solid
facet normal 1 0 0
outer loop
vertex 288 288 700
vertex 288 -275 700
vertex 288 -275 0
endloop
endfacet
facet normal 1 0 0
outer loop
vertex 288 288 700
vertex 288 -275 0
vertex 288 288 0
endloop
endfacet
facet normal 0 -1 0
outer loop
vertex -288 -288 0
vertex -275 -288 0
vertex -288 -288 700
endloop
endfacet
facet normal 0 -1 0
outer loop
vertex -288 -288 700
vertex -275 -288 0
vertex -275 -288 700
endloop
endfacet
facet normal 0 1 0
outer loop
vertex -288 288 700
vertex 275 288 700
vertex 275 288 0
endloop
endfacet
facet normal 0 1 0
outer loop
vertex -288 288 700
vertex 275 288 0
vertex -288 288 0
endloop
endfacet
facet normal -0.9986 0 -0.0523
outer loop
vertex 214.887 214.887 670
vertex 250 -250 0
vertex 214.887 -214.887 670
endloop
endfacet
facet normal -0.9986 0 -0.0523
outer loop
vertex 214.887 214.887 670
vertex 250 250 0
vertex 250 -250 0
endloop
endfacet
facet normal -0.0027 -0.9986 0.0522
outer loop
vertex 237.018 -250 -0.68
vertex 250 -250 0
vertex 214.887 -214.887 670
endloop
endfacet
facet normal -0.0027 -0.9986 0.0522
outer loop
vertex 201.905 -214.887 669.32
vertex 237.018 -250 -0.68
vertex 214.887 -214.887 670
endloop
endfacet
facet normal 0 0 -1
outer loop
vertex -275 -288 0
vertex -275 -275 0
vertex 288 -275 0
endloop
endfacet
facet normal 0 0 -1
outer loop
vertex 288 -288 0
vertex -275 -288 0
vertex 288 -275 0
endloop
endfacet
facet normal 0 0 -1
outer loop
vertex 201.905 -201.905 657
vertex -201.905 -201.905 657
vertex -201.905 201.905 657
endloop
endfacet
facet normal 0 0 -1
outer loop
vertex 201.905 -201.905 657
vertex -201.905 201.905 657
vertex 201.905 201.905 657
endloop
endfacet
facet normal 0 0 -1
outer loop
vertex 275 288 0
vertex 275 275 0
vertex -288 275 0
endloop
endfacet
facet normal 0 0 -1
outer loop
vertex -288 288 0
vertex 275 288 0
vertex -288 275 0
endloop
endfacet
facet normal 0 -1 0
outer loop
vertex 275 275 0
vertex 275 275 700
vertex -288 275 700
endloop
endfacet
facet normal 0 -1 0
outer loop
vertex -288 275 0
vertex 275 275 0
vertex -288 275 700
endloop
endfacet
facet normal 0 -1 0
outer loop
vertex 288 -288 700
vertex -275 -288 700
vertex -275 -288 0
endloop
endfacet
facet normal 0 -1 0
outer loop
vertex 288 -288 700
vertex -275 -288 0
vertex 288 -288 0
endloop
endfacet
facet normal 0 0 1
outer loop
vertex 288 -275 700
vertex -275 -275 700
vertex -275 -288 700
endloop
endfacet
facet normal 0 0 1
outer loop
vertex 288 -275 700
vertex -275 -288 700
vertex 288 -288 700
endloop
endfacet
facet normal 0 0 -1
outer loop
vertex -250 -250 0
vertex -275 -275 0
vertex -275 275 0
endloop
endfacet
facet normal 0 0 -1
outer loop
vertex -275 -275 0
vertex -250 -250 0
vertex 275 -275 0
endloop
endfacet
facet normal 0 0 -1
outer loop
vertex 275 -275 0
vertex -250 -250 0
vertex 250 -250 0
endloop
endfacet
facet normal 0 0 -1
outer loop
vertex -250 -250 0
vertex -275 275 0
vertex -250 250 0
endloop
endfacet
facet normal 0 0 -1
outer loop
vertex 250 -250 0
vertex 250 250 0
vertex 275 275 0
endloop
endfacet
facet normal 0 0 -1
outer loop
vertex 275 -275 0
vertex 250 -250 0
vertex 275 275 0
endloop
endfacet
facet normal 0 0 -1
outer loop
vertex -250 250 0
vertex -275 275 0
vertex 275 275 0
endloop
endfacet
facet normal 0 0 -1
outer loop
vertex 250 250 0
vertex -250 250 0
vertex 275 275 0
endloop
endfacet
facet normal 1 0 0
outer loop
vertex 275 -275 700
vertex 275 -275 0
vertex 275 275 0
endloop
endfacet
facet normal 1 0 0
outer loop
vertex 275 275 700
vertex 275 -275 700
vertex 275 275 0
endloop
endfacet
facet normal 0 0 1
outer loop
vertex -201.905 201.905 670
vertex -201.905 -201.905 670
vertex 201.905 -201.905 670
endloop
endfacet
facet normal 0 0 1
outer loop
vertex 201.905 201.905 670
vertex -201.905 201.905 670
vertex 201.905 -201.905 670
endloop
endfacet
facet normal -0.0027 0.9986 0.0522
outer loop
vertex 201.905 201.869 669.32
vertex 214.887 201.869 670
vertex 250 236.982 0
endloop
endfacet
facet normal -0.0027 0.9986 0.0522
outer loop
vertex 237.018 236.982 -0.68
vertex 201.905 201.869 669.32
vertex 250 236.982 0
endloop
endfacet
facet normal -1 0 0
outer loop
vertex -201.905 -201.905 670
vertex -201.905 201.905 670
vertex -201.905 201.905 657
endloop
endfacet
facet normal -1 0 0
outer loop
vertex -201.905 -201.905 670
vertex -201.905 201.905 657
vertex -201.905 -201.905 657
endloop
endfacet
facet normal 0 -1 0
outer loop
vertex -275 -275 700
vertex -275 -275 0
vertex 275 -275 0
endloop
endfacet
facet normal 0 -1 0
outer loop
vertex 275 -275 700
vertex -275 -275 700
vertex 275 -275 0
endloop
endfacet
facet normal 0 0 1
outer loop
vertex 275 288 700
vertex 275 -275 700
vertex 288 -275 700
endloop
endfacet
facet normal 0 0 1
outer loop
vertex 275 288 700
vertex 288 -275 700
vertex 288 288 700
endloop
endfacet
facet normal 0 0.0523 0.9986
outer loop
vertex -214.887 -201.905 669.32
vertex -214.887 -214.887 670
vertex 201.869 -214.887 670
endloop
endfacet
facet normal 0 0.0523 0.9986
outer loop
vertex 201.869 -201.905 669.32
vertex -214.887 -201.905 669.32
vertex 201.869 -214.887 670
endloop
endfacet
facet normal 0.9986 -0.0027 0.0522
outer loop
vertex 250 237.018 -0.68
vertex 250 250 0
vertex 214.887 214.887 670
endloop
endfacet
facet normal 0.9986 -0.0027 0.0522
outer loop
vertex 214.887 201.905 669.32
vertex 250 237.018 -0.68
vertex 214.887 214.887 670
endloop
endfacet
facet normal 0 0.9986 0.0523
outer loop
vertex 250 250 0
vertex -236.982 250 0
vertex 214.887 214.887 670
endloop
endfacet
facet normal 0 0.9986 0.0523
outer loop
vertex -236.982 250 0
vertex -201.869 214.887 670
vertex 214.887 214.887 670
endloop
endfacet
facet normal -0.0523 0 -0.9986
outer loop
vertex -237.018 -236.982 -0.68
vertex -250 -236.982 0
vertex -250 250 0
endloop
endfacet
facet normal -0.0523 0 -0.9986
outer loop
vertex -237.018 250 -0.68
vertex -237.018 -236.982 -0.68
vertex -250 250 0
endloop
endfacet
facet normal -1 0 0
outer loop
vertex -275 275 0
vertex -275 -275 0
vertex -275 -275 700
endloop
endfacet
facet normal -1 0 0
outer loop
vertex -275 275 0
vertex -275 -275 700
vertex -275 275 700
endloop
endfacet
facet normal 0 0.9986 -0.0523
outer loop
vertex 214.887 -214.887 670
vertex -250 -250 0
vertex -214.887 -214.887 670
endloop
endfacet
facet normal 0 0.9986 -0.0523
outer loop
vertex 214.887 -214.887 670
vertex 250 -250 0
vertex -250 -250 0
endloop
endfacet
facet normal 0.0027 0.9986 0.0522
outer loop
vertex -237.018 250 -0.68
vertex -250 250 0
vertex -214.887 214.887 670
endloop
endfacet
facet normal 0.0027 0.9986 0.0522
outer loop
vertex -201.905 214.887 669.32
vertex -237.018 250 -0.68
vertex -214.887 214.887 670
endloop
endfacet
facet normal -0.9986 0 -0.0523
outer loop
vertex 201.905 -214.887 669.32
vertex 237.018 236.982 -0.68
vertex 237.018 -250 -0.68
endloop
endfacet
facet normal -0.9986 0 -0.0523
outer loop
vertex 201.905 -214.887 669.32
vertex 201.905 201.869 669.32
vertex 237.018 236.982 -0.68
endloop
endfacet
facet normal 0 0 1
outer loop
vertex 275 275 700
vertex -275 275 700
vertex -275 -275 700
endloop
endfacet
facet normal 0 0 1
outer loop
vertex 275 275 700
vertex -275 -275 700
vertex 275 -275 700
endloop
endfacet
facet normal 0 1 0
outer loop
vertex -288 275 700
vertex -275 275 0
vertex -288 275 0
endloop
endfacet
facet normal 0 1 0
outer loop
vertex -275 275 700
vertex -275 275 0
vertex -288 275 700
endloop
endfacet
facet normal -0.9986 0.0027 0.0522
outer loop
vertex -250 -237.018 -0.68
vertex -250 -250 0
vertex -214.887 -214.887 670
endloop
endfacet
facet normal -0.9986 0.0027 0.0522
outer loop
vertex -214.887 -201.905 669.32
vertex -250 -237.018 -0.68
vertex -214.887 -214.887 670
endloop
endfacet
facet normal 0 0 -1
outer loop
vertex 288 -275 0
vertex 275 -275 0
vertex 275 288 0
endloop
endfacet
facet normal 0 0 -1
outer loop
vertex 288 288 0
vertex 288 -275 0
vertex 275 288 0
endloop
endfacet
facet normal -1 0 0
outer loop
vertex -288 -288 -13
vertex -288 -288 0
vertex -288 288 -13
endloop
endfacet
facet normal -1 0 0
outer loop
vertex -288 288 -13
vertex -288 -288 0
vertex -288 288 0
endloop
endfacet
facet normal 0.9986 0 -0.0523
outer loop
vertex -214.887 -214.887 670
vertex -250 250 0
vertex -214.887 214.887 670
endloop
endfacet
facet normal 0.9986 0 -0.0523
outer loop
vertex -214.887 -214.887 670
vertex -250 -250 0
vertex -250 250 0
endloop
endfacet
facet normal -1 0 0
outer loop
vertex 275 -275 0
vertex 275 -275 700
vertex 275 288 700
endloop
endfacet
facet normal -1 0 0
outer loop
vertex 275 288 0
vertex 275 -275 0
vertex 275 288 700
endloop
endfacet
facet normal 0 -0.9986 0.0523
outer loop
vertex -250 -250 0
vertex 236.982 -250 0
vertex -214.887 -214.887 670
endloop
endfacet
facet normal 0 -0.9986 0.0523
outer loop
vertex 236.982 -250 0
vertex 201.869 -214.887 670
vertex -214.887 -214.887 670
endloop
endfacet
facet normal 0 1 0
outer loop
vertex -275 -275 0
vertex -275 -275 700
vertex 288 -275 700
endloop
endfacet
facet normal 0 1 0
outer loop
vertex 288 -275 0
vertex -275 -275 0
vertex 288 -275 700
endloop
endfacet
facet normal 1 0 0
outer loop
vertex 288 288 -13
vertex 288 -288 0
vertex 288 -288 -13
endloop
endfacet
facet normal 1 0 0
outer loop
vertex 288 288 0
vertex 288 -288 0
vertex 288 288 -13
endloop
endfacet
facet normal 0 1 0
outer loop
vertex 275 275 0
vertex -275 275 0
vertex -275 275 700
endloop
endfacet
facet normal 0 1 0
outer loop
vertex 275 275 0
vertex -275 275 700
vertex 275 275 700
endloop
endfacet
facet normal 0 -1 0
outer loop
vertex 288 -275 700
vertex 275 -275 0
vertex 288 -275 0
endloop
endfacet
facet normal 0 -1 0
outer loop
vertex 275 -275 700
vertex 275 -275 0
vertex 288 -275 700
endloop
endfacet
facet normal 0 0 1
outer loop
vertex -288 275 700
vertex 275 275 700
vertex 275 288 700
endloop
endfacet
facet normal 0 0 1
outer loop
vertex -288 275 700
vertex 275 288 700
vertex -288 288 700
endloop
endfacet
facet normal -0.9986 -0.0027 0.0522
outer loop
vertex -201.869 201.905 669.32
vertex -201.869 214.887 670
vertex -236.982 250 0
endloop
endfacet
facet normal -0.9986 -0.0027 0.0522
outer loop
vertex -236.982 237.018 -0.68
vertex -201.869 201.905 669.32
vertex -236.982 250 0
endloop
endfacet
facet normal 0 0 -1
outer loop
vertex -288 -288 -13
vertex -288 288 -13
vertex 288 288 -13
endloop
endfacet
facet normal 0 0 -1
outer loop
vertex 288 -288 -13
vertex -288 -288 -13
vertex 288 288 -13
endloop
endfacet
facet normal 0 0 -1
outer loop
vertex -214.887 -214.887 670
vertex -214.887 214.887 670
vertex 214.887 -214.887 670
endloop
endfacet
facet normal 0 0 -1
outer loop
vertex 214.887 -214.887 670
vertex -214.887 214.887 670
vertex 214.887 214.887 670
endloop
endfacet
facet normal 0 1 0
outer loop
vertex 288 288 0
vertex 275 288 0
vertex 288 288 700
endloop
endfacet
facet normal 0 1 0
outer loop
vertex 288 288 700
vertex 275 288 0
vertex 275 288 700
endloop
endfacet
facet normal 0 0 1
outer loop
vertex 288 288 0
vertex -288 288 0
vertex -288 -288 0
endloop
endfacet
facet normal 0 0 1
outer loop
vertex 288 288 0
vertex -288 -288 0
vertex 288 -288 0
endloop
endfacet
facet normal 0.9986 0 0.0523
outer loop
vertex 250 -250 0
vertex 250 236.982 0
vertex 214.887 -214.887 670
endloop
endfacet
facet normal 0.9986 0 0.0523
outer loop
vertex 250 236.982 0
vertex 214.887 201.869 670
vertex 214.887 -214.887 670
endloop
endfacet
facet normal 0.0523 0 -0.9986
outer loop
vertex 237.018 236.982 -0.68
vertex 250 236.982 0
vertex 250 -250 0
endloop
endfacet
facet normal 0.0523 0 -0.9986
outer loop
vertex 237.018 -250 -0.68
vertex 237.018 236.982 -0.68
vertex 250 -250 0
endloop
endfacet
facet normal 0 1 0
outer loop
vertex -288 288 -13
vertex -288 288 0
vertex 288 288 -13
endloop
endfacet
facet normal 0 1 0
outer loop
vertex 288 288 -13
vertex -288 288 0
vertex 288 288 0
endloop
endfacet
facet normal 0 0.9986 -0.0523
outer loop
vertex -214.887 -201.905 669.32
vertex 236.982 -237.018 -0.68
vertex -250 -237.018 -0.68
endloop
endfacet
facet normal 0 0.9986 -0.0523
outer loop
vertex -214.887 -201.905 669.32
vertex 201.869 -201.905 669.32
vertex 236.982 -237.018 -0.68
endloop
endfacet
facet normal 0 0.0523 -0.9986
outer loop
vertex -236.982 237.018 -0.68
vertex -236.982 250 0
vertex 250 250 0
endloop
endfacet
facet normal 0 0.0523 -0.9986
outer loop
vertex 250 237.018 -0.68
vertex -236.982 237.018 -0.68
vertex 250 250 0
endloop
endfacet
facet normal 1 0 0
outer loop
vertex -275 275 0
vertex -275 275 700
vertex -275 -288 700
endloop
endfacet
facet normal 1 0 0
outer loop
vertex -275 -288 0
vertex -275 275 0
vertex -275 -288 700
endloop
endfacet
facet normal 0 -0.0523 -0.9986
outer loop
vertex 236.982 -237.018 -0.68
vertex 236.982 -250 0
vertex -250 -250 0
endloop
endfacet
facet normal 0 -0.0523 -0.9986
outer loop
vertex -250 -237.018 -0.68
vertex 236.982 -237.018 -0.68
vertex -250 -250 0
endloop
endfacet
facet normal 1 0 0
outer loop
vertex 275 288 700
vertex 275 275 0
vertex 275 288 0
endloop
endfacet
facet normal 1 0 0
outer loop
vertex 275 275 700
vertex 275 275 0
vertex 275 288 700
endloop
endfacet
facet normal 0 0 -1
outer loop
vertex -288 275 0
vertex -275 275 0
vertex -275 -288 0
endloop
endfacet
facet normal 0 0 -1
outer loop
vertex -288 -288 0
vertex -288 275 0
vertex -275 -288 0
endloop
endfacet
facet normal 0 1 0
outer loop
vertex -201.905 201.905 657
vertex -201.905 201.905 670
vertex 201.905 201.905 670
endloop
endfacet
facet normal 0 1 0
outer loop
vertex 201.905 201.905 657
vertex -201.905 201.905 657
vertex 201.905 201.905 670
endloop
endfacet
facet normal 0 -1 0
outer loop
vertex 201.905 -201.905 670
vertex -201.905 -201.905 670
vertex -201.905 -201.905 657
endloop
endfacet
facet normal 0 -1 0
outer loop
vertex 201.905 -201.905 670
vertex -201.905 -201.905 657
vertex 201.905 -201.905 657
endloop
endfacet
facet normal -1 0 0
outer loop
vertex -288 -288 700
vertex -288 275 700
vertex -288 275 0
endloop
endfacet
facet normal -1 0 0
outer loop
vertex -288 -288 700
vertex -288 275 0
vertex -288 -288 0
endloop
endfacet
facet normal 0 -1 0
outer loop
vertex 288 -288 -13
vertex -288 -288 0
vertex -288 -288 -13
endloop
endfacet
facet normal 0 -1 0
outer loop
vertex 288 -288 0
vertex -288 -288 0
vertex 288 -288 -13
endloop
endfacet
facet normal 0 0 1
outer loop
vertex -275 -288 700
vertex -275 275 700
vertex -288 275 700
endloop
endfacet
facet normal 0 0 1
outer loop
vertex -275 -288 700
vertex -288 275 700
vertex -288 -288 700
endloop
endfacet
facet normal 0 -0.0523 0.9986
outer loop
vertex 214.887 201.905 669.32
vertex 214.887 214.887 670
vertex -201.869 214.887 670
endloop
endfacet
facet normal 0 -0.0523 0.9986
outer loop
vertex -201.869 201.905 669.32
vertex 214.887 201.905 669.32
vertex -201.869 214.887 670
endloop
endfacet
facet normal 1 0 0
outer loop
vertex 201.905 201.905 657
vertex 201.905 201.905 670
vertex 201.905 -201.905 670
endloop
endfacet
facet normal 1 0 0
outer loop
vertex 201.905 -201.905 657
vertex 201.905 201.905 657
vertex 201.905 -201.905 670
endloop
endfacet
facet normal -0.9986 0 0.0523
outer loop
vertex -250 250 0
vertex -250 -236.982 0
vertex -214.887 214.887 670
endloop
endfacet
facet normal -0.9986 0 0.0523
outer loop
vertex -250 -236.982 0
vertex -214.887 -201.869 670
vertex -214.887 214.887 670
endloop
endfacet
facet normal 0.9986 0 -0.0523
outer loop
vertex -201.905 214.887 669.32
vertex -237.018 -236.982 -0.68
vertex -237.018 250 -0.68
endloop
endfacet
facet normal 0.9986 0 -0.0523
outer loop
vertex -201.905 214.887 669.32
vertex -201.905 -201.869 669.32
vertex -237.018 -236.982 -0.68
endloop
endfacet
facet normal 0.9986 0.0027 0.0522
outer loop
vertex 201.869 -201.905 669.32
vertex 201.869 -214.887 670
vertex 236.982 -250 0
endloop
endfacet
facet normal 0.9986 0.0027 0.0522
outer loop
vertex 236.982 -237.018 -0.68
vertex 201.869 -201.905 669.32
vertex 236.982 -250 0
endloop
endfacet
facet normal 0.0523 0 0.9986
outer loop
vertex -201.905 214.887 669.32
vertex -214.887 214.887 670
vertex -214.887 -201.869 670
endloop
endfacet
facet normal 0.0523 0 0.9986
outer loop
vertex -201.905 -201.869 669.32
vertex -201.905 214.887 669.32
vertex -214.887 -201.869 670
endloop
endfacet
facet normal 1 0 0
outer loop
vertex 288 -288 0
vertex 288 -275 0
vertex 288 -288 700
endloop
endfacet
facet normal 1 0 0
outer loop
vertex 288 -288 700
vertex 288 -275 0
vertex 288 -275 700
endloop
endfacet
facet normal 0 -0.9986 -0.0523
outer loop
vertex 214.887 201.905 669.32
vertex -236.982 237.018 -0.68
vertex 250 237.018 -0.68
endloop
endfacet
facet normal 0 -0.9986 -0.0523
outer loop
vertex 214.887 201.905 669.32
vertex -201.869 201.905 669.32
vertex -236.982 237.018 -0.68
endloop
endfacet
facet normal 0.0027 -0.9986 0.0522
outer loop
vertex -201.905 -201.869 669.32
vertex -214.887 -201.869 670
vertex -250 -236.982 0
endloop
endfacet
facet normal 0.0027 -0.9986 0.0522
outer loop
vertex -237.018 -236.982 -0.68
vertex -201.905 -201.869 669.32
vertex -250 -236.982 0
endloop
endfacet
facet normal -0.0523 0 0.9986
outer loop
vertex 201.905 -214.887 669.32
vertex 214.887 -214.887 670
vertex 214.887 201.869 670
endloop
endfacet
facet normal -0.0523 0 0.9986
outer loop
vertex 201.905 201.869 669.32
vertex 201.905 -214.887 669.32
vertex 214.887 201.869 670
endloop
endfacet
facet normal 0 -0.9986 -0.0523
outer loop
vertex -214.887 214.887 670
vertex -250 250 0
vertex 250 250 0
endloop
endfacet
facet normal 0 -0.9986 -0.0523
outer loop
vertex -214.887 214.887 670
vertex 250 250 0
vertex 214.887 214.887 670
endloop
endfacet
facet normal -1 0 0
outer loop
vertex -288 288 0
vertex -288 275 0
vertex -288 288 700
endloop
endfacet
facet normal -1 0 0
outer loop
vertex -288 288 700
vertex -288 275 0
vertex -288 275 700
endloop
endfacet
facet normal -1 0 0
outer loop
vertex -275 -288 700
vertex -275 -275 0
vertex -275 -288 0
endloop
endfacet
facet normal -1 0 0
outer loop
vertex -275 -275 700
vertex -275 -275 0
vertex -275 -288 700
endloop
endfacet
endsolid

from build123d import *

# Parameters (mm, degrees)
F0_W      = 550
F0_H      = 550
F1_DEPTH  = 700
F2_W      = 500
F2_H      = 500
F3_DEPTH  = 670
F3_TAPER  = 3
F5_DEPTH  = 13
F7_DEPTH  = 13
F9_DEPTH  = 13
F11_DEPTH = 13
F12_W     = 403.8092078571
F12_H     = 403.8092078571
F13_DEPTH = 13
F14_W     = 563
F14_H     = 700
F15_DEPTH = 13
F16_W     = 563
F16_H     = 700
F17_DEPTH = 13
F18_W     = 563
F18_H     = 700
F19_DEPTH = 13
F20_W     = 563
F20_H     = 700
F21_DEPTH = 13
F22_W     = 576
F22_H     = 576
F23_DEPTH = 13


with BuildPart() as f1:
    # F0 (on Top) → F1 (new body)
    with BuildSketch(Plane.XY):
        Rectangle(F0_W, F0_H)
    extrude(amount=F1_DEPTH)

    # F2 (on Top) → F3 (cut)
    with BuildSketch(Plane.XY):
        Rectangle(F2_W, F2_H)
    extrude(amount=F3_DEPTH, taper=F3_TAPER, mode=Mode.SUBTRACT)


with BuildPart() as f5:
    # F4 (on face) → F5 (new body)
    with BuildSketch(Plane(origin=(0, -249.315236921, 13.0660579085), x_dir=(-1, 0, 0), z_dir=(0, 0.9986295348, -0.0523359562))):
        Polygon((-236.9822083347, -13.0839890607), (250, -13.0839890607), (214.8867878804, 657.8354827579), (-201.8689962151, 657.8354827579), align=None)
    extrude(amount=F5_DEPTH)


with BuildPart() as f7:
    # F6 (on face) → F7 (new body)
    with BuildSketch(Plane(origin=(249.315236921, 0, 13.0660579085), x_dir=(0, -1, 0), z_dir=(-0.9986295348, 0, -0.0523359562))):
        Polygon((-236.9822083347, -13.0839890607), (250, -13.0839890607), (214.8867878804, 657.8354827579), (-201.8689962151, 657.8354827579), align=None)
    extrude(amount=F7_DEPTH)


with BuildPart() as f9:
    # F8 (on face) → F9 (new body)
    with BuildSketch(Plane(origin=(0, 249.315236921, 13.0660579085), x_dir=(1, 0, 0), z_dir=(0, -0.9986295348, -0.0523359562))):
        Polygon((-236.9822083347, -13.0839890607), (250, -13.0839890607), (214.8867878804, 657.8354827579), (-201.8689962151, 657.8354827579), align=None)
    extrude(amount=F9_DEPTH)


with BuildPart() as f11:
    # F10 (on face) → F11 (new body)
    with BuildSketch(Plane(origin=(-249.315236921, 0, 13.0660579085), x_dir=(0, 1, 0), z_dir=(0.9986295348, 0, -0.0523359562))):
        Polygon((-236.9822083347, -13.0839890607), (250, -13.0839890607), (214.8867878804, 657.8354827579), (-201.8689962151, 657.8354827579), align=None)
    extrude(amount=F11_DEPTH)


with BuildPart() as f13:
    # F12 (on face) → F13 (new body)
    with BuildSketch(Plane(origin=(0, 0, 670), x_dir=(1, 0, 0), z_dir=(0, 0, -1))):
        Rectangle(F12_W, F12_H)
    extrude(amount=F13_DEPTH)


with BuildPart() as f15:
    # F14 (on face) → F15 (new body)
    with BuildSketch(Plane(origin=(0, 275, 0), x_dir=(-1, 0, 0), z_dir=(0, 1, 0))):
        with Locations((6.5, 350)):
            Rectangle(F14_W, F14_H)
    extrude(amount=F15_DEPTH)


with BuildPart() as f17:
    # F16 (on face) → F17 (new body)
    with BuildSketch(Plane(origin=(-275, 0, 0), x_dir=(0, -1, 0), z_dir=(-1, 0, 0))):
        with Locations((6.5, 350)):
            Rectangle(F16_W, F16_H)
    extrude(amount=F17_DEPTH)


with BuildPart() as f19:
    # F18 (on face) → F19 (new body)
    with BuildSketch(Plane.XZ.offset(275)):
        with Locations((6.5, 350)):
            Rectangle(F18_W, F18_H)
    extrude(amount=F19_DEPTH)


with BuildPart() as f21:
    # F20 (on face) → F21 (new body)
    with BuildSketch(Plane.YZ.offset(275)):
        with Locations((6.5, 350)):
            Rectangle(F20_W, F20_H)
    extrude(amount=F21_DEPTH)


with BuildPart() as f23:
    # F22 (on Top) → F23 (new body)
    with BuildSketch(Plane.XY):
        Rectangle(F22_W, F22_H)
    extrude(amount=-F23_DEPTH)


solid = Compound([f1.part, f5.part, f7.part, f9.part, f11.part, f13.part, f15.part, f17.part, f19.part, f21.part, f23.part])
